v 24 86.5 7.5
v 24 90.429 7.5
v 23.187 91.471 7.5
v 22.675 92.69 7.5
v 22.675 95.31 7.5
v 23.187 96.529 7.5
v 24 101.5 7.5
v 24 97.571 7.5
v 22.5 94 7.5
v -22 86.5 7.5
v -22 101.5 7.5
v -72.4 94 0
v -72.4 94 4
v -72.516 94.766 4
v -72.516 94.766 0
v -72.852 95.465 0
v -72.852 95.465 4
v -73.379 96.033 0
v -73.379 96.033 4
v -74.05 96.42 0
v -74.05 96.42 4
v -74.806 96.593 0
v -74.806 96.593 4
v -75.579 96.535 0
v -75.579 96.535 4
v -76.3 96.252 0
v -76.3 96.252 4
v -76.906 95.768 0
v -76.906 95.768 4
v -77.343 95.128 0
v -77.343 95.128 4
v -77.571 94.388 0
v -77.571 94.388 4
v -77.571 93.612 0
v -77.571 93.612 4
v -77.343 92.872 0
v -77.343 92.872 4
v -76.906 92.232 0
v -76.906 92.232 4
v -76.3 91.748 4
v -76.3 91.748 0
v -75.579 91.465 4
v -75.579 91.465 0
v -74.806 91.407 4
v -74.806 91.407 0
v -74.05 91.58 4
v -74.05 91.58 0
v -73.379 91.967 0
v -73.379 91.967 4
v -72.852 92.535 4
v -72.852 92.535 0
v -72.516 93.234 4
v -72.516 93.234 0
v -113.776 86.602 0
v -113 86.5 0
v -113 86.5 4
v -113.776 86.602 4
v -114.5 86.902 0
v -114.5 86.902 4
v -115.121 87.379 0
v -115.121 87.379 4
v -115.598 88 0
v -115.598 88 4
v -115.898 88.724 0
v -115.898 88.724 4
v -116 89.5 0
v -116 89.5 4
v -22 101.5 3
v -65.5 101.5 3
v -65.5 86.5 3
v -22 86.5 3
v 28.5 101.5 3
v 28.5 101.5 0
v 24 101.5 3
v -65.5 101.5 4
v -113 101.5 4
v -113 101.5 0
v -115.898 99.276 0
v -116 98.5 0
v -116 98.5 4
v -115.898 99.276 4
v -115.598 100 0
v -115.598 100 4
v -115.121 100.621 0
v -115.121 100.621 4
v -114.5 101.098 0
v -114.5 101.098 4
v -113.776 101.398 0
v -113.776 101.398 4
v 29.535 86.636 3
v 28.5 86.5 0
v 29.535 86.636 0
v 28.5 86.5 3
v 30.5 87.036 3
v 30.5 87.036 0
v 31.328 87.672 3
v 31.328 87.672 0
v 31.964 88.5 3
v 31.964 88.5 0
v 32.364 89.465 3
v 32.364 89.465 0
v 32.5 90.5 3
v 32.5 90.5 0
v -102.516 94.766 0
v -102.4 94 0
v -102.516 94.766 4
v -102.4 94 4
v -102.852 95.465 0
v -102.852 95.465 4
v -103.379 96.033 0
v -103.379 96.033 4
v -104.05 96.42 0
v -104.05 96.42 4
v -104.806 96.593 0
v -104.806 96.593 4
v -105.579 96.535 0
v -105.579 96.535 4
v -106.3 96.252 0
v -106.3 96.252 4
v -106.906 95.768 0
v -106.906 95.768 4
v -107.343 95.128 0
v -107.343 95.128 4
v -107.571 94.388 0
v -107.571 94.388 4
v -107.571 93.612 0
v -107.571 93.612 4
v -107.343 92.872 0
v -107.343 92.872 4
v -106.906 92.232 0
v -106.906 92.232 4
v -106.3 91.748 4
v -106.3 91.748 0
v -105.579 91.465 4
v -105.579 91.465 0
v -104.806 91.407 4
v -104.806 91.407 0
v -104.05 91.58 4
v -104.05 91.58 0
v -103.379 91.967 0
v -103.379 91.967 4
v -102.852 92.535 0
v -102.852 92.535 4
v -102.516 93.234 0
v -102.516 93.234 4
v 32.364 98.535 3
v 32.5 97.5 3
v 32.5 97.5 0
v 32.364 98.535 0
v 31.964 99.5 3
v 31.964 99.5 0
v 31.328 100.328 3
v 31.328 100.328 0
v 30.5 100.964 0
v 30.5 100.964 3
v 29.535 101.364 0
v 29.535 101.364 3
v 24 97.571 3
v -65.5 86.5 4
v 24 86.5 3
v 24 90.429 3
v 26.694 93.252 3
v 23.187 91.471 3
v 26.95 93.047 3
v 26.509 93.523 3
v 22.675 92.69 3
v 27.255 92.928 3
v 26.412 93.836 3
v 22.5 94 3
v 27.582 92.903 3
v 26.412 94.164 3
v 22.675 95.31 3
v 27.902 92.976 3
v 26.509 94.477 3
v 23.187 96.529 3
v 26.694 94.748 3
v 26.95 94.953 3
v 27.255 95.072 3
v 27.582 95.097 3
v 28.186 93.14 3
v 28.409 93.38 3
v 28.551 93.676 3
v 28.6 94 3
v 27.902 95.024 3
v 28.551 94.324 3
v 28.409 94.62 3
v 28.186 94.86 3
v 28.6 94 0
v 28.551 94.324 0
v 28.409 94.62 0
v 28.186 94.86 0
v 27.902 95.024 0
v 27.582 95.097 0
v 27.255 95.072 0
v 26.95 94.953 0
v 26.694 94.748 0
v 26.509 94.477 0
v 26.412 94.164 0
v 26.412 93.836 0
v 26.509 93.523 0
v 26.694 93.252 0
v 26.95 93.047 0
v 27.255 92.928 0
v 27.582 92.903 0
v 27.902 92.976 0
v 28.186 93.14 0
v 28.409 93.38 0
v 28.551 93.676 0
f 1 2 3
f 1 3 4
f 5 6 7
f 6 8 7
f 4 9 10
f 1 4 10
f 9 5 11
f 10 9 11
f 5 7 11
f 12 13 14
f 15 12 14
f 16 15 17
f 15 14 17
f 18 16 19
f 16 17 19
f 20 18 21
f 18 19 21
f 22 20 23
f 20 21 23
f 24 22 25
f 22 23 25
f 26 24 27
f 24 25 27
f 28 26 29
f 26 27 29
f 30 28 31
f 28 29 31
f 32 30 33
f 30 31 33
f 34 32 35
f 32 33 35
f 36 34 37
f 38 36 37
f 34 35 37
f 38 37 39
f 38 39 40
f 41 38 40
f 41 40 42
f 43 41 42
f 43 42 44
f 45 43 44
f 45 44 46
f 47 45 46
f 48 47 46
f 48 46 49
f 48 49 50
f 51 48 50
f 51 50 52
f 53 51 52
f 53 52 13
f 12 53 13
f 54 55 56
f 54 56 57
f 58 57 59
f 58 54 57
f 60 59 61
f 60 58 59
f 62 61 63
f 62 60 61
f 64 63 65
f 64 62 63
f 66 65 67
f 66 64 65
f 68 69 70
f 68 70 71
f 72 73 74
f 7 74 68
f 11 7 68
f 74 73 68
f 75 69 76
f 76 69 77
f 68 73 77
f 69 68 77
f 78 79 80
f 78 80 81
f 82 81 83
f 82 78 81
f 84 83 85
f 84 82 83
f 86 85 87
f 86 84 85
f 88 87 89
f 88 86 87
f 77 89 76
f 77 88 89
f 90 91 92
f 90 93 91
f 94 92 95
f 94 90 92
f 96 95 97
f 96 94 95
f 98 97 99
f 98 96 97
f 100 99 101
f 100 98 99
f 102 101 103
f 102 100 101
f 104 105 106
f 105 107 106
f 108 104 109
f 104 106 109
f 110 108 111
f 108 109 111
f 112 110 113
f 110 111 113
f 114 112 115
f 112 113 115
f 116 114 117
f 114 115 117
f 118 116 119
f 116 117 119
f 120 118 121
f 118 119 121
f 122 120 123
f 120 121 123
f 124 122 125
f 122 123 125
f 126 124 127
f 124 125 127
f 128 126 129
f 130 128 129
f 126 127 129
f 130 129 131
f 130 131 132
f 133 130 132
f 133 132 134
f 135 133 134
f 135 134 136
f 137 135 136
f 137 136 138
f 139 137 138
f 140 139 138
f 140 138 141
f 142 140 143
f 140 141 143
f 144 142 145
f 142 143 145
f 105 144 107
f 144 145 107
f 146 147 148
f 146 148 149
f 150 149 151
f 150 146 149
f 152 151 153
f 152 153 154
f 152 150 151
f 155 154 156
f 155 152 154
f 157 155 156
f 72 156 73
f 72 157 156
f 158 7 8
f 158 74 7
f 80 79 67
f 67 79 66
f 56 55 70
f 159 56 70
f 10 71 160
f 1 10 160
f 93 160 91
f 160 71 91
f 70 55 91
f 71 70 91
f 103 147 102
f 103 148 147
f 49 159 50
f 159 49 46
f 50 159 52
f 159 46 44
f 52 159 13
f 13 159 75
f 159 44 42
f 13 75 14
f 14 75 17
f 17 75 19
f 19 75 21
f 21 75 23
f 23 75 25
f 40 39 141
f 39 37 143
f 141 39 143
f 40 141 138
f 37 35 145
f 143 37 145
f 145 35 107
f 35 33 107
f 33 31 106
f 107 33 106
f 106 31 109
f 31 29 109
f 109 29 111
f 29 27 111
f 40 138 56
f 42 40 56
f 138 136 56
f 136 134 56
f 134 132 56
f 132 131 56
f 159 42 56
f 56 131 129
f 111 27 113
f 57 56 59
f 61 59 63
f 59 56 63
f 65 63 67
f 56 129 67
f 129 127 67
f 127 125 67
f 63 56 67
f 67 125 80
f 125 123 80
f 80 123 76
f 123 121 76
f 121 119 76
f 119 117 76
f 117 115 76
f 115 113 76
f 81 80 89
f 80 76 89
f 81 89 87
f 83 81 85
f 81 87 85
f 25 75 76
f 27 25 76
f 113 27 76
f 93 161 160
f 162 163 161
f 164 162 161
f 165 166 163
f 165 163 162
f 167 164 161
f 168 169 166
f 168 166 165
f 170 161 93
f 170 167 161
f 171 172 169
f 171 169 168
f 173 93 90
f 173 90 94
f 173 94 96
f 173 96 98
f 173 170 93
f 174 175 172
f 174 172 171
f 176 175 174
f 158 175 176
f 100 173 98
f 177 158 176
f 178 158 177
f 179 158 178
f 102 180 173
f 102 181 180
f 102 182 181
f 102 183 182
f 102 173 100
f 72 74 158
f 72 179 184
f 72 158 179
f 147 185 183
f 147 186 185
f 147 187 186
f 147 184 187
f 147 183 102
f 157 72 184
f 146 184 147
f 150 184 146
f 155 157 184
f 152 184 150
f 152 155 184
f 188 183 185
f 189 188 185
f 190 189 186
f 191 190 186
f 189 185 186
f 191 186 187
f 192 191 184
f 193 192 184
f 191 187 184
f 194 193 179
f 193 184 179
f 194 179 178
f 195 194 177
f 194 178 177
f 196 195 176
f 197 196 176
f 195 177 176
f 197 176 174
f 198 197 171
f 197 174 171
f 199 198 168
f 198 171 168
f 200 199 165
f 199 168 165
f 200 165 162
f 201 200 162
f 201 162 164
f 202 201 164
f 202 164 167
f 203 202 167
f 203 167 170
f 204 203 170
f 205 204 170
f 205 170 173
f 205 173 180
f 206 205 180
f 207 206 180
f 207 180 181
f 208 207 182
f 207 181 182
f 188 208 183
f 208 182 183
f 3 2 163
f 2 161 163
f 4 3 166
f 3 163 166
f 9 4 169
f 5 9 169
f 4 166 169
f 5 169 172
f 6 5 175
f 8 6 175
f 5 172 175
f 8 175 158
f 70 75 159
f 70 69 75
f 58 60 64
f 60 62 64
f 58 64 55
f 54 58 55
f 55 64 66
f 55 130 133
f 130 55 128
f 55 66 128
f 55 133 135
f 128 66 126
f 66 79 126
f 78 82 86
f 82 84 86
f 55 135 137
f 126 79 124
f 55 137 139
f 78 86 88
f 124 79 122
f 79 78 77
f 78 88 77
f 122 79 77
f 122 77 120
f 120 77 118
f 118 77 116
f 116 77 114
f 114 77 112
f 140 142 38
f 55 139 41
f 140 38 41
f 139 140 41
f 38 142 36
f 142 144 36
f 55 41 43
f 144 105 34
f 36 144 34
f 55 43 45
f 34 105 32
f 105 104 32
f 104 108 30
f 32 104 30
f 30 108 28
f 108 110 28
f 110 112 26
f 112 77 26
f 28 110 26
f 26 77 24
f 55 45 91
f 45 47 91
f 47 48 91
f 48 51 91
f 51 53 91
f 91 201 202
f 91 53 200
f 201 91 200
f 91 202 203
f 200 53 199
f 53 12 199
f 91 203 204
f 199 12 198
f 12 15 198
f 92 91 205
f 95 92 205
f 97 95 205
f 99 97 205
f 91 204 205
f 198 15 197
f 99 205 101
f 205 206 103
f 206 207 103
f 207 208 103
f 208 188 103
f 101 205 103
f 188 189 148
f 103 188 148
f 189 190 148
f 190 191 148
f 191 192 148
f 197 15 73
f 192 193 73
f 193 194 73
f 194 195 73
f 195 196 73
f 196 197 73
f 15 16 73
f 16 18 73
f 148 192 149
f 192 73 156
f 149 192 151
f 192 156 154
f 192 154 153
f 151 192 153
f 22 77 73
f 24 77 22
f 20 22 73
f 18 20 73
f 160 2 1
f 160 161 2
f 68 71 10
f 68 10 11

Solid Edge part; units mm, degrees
sketch "Sketch1" plane through (0, 0, 0) normal (0, 0, 1) x (1, 0, 0)
  line L0 (-116, 86.5) -> (32.5, 86.5)
  line L1 (32.5, 101.5) -> (32.5, 86.5)
  line L2 (32.5, 101.5) -> (-116, 101.5)
  line L3 (-116, 101.5) -> (-116, 86.5)
extrude "Protrusion1" add sketch "Sketch1" along normal blind 3
sketch "Sketch2" plane through (26, 94, 3) normal (0, 0, 1) x (1, 0, 0)
  circle A0 centre (1.5, 0) radius 1.1
extrude "Cutout1" cut sketch "Sketch2" against normal up to next
fillet "Round_3" radius 4 2 edges at (32.5, 86.5, 1.5) (32.5, 101.5, 1.5)
sketch "Sketch3" plane through (-41.5, 94, 3) normal (0, 0, 1) x (1, 0, 0)
  line L0 (65.5, -3.5707) -> (65.5, -7.5)
  line L1 (65.5, -7.5) -> (19.5, -7.5)
  line L2 (19.5, -7.5) -> (19.5, 7.5)
  line L3 (65.5, 7.5) -> (19.5, 7.5)
  line L4 (65.5, 7.5) -> (65.5, 3.5707)
  arc A0 (65.5, -3.5707) -> (65.5, 3.5707) centre (69, 0) cw
extrude "ExtrudedProtrusion_7" add sketch "Sketch3" along normal blind 4.5
sketch "Sketch4" plane through (-68.75, 94, 3) normal (0, 0, 1) x (1, 0, 0)
  line L0 (-47.25, 7.5) -> (3.25, 7.5)
  line L1 (3.25, 7.5) -> (3.25, -7.5)
  line L2 (-47.25, -7.5) -> (3.25, -7.5)
  line L3 (-47.25, 7.5) -> (-47.25, -7.5)
extrude "ExtrudedProtrusion_8" add sketch "Sketch4" along normal blind 1
sketch "Sketch5" plane through (-68.75, 94, 3) normal (0, 0, 1) x (1, 0, 0)
  circle A0 centre (-36.25, 0) radius 2.6
  circle A1 centre (-6.25, 0) radius 2.6
extrude "Cutout2" cut sketch "Sketch5" along normal mid plane 10.057
fillet "Round_4" radius 3 2 edges at (-116, 86.5, 2) (-116, 101.5, 2)
